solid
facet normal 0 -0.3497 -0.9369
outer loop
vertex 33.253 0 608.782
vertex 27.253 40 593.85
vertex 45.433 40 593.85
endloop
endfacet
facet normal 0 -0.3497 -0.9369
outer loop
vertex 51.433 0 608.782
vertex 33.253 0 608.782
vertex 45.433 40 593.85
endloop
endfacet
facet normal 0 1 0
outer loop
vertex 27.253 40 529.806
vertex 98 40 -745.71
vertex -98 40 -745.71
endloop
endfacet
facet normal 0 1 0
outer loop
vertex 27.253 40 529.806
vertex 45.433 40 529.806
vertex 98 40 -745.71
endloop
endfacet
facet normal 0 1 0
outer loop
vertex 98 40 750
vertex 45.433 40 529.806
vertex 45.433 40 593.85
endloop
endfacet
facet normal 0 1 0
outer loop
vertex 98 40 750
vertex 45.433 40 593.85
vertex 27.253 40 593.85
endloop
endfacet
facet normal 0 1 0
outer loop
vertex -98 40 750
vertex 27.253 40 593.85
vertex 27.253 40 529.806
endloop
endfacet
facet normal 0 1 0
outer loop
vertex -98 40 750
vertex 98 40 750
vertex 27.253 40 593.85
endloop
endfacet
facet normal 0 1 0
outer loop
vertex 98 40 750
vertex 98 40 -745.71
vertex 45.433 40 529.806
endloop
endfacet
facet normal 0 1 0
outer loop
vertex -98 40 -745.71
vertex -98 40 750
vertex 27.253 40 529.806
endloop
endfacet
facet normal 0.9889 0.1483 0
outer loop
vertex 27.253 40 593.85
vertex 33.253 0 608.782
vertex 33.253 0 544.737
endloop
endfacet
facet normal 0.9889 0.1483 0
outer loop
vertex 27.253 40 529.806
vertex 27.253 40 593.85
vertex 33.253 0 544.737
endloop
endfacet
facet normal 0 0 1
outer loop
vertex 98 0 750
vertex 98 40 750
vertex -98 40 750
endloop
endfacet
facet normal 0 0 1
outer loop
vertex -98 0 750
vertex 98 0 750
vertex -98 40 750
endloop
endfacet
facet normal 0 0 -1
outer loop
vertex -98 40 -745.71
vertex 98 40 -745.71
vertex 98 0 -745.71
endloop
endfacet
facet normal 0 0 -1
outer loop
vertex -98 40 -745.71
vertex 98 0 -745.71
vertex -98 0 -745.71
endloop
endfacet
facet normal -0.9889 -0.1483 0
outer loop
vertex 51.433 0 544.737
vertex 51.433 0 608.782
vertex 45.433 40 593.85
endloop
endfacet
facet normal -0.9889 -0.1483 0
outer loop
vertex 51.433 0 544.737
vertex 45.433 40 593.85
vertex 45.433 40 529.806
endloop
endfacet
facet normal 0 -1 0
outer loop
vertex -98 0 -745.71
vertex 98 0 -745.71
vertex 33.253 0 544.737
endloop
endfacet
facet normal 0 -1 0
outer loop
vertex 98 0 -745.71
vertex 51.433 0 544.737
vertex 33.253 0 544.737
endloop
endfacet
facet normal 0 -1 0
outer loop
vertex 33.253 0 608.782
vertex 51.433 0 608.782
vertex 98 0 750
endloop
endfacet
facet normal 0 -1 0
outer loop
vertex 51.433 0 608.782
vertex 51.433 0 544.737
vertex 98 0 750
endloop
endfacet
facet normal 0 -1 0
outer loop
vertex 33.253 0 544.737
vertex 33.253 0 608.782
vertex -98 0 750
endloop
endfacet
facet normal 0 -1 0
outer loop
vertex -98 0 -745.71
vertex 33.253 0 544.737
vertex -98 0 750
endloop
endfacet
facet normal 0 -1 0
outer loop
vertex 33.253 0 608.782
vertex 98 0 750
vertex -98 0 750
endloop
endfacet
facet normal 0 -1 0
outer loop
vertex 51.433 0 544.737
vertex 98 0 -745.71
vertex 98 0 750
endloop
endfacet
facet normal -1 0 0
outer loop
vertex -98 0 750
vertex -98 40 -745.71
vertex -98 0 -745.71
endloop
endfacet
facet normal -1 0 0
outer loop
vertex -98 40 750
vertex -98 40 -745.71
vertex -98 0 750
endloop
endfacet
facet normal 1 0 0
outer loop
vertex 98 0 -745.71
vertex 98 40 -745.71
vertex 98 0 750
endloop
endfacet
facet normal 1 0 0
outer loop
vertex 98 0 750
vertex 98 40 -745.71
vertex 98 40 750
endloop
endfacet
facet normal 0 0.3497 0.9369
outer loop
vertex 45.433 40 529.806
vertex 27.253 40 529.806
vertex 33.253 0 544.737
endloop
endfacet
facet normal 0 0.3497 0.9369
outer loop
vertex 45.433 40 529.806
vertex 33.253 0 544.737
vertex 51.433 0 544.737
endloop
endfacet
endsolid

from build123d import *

# Parameters (mm, degrees)
SKETCH_4_W          = 196
SKETCH_4_H          = 1495.709506603
EXTRUDE_2_DEPTH     = 40
SKETCH_10_W         = 18.18
SKETCH_10_H         = 64.044231727
CUT_EXTRUDE_1_DEPTH = 46.474040195


with BuildPart() as part:
    # 草圖4 → 填料-伸長2 (new body)
    with BuildSketch(Plane(origin=(0, 40, 0), x_dir=(-1, 0, 0), z_dir=(0, 1, 0))):
        with Locations((0, 2.145246698)):
            Rectangle(SKETCH_4_W, SKETCH_4_H)
    extrude(amount=-EXTRUDE_2_DEPTH)

    # 草圖10 → 除料-伸長1 (cut, along a direction that is not the sketch's normal)
    with BuildSketch(Plane(origin=(0, 0, 0), x_dir=(1, 0, 0), z_dir=(0, 1, 0))):
        with Locations((42.342503168, -576.7595183)):
            Rectangle(SKETCH_10_W, SKETCH_10_H)
    extrude(amount=CUT_EXTRUDE_1_DEPTH, dir=(-0.13916051909627253, 0.9277367939751496, -0.34632180270604807), mode=Mode.SUBTRACT)


solid = part.part
